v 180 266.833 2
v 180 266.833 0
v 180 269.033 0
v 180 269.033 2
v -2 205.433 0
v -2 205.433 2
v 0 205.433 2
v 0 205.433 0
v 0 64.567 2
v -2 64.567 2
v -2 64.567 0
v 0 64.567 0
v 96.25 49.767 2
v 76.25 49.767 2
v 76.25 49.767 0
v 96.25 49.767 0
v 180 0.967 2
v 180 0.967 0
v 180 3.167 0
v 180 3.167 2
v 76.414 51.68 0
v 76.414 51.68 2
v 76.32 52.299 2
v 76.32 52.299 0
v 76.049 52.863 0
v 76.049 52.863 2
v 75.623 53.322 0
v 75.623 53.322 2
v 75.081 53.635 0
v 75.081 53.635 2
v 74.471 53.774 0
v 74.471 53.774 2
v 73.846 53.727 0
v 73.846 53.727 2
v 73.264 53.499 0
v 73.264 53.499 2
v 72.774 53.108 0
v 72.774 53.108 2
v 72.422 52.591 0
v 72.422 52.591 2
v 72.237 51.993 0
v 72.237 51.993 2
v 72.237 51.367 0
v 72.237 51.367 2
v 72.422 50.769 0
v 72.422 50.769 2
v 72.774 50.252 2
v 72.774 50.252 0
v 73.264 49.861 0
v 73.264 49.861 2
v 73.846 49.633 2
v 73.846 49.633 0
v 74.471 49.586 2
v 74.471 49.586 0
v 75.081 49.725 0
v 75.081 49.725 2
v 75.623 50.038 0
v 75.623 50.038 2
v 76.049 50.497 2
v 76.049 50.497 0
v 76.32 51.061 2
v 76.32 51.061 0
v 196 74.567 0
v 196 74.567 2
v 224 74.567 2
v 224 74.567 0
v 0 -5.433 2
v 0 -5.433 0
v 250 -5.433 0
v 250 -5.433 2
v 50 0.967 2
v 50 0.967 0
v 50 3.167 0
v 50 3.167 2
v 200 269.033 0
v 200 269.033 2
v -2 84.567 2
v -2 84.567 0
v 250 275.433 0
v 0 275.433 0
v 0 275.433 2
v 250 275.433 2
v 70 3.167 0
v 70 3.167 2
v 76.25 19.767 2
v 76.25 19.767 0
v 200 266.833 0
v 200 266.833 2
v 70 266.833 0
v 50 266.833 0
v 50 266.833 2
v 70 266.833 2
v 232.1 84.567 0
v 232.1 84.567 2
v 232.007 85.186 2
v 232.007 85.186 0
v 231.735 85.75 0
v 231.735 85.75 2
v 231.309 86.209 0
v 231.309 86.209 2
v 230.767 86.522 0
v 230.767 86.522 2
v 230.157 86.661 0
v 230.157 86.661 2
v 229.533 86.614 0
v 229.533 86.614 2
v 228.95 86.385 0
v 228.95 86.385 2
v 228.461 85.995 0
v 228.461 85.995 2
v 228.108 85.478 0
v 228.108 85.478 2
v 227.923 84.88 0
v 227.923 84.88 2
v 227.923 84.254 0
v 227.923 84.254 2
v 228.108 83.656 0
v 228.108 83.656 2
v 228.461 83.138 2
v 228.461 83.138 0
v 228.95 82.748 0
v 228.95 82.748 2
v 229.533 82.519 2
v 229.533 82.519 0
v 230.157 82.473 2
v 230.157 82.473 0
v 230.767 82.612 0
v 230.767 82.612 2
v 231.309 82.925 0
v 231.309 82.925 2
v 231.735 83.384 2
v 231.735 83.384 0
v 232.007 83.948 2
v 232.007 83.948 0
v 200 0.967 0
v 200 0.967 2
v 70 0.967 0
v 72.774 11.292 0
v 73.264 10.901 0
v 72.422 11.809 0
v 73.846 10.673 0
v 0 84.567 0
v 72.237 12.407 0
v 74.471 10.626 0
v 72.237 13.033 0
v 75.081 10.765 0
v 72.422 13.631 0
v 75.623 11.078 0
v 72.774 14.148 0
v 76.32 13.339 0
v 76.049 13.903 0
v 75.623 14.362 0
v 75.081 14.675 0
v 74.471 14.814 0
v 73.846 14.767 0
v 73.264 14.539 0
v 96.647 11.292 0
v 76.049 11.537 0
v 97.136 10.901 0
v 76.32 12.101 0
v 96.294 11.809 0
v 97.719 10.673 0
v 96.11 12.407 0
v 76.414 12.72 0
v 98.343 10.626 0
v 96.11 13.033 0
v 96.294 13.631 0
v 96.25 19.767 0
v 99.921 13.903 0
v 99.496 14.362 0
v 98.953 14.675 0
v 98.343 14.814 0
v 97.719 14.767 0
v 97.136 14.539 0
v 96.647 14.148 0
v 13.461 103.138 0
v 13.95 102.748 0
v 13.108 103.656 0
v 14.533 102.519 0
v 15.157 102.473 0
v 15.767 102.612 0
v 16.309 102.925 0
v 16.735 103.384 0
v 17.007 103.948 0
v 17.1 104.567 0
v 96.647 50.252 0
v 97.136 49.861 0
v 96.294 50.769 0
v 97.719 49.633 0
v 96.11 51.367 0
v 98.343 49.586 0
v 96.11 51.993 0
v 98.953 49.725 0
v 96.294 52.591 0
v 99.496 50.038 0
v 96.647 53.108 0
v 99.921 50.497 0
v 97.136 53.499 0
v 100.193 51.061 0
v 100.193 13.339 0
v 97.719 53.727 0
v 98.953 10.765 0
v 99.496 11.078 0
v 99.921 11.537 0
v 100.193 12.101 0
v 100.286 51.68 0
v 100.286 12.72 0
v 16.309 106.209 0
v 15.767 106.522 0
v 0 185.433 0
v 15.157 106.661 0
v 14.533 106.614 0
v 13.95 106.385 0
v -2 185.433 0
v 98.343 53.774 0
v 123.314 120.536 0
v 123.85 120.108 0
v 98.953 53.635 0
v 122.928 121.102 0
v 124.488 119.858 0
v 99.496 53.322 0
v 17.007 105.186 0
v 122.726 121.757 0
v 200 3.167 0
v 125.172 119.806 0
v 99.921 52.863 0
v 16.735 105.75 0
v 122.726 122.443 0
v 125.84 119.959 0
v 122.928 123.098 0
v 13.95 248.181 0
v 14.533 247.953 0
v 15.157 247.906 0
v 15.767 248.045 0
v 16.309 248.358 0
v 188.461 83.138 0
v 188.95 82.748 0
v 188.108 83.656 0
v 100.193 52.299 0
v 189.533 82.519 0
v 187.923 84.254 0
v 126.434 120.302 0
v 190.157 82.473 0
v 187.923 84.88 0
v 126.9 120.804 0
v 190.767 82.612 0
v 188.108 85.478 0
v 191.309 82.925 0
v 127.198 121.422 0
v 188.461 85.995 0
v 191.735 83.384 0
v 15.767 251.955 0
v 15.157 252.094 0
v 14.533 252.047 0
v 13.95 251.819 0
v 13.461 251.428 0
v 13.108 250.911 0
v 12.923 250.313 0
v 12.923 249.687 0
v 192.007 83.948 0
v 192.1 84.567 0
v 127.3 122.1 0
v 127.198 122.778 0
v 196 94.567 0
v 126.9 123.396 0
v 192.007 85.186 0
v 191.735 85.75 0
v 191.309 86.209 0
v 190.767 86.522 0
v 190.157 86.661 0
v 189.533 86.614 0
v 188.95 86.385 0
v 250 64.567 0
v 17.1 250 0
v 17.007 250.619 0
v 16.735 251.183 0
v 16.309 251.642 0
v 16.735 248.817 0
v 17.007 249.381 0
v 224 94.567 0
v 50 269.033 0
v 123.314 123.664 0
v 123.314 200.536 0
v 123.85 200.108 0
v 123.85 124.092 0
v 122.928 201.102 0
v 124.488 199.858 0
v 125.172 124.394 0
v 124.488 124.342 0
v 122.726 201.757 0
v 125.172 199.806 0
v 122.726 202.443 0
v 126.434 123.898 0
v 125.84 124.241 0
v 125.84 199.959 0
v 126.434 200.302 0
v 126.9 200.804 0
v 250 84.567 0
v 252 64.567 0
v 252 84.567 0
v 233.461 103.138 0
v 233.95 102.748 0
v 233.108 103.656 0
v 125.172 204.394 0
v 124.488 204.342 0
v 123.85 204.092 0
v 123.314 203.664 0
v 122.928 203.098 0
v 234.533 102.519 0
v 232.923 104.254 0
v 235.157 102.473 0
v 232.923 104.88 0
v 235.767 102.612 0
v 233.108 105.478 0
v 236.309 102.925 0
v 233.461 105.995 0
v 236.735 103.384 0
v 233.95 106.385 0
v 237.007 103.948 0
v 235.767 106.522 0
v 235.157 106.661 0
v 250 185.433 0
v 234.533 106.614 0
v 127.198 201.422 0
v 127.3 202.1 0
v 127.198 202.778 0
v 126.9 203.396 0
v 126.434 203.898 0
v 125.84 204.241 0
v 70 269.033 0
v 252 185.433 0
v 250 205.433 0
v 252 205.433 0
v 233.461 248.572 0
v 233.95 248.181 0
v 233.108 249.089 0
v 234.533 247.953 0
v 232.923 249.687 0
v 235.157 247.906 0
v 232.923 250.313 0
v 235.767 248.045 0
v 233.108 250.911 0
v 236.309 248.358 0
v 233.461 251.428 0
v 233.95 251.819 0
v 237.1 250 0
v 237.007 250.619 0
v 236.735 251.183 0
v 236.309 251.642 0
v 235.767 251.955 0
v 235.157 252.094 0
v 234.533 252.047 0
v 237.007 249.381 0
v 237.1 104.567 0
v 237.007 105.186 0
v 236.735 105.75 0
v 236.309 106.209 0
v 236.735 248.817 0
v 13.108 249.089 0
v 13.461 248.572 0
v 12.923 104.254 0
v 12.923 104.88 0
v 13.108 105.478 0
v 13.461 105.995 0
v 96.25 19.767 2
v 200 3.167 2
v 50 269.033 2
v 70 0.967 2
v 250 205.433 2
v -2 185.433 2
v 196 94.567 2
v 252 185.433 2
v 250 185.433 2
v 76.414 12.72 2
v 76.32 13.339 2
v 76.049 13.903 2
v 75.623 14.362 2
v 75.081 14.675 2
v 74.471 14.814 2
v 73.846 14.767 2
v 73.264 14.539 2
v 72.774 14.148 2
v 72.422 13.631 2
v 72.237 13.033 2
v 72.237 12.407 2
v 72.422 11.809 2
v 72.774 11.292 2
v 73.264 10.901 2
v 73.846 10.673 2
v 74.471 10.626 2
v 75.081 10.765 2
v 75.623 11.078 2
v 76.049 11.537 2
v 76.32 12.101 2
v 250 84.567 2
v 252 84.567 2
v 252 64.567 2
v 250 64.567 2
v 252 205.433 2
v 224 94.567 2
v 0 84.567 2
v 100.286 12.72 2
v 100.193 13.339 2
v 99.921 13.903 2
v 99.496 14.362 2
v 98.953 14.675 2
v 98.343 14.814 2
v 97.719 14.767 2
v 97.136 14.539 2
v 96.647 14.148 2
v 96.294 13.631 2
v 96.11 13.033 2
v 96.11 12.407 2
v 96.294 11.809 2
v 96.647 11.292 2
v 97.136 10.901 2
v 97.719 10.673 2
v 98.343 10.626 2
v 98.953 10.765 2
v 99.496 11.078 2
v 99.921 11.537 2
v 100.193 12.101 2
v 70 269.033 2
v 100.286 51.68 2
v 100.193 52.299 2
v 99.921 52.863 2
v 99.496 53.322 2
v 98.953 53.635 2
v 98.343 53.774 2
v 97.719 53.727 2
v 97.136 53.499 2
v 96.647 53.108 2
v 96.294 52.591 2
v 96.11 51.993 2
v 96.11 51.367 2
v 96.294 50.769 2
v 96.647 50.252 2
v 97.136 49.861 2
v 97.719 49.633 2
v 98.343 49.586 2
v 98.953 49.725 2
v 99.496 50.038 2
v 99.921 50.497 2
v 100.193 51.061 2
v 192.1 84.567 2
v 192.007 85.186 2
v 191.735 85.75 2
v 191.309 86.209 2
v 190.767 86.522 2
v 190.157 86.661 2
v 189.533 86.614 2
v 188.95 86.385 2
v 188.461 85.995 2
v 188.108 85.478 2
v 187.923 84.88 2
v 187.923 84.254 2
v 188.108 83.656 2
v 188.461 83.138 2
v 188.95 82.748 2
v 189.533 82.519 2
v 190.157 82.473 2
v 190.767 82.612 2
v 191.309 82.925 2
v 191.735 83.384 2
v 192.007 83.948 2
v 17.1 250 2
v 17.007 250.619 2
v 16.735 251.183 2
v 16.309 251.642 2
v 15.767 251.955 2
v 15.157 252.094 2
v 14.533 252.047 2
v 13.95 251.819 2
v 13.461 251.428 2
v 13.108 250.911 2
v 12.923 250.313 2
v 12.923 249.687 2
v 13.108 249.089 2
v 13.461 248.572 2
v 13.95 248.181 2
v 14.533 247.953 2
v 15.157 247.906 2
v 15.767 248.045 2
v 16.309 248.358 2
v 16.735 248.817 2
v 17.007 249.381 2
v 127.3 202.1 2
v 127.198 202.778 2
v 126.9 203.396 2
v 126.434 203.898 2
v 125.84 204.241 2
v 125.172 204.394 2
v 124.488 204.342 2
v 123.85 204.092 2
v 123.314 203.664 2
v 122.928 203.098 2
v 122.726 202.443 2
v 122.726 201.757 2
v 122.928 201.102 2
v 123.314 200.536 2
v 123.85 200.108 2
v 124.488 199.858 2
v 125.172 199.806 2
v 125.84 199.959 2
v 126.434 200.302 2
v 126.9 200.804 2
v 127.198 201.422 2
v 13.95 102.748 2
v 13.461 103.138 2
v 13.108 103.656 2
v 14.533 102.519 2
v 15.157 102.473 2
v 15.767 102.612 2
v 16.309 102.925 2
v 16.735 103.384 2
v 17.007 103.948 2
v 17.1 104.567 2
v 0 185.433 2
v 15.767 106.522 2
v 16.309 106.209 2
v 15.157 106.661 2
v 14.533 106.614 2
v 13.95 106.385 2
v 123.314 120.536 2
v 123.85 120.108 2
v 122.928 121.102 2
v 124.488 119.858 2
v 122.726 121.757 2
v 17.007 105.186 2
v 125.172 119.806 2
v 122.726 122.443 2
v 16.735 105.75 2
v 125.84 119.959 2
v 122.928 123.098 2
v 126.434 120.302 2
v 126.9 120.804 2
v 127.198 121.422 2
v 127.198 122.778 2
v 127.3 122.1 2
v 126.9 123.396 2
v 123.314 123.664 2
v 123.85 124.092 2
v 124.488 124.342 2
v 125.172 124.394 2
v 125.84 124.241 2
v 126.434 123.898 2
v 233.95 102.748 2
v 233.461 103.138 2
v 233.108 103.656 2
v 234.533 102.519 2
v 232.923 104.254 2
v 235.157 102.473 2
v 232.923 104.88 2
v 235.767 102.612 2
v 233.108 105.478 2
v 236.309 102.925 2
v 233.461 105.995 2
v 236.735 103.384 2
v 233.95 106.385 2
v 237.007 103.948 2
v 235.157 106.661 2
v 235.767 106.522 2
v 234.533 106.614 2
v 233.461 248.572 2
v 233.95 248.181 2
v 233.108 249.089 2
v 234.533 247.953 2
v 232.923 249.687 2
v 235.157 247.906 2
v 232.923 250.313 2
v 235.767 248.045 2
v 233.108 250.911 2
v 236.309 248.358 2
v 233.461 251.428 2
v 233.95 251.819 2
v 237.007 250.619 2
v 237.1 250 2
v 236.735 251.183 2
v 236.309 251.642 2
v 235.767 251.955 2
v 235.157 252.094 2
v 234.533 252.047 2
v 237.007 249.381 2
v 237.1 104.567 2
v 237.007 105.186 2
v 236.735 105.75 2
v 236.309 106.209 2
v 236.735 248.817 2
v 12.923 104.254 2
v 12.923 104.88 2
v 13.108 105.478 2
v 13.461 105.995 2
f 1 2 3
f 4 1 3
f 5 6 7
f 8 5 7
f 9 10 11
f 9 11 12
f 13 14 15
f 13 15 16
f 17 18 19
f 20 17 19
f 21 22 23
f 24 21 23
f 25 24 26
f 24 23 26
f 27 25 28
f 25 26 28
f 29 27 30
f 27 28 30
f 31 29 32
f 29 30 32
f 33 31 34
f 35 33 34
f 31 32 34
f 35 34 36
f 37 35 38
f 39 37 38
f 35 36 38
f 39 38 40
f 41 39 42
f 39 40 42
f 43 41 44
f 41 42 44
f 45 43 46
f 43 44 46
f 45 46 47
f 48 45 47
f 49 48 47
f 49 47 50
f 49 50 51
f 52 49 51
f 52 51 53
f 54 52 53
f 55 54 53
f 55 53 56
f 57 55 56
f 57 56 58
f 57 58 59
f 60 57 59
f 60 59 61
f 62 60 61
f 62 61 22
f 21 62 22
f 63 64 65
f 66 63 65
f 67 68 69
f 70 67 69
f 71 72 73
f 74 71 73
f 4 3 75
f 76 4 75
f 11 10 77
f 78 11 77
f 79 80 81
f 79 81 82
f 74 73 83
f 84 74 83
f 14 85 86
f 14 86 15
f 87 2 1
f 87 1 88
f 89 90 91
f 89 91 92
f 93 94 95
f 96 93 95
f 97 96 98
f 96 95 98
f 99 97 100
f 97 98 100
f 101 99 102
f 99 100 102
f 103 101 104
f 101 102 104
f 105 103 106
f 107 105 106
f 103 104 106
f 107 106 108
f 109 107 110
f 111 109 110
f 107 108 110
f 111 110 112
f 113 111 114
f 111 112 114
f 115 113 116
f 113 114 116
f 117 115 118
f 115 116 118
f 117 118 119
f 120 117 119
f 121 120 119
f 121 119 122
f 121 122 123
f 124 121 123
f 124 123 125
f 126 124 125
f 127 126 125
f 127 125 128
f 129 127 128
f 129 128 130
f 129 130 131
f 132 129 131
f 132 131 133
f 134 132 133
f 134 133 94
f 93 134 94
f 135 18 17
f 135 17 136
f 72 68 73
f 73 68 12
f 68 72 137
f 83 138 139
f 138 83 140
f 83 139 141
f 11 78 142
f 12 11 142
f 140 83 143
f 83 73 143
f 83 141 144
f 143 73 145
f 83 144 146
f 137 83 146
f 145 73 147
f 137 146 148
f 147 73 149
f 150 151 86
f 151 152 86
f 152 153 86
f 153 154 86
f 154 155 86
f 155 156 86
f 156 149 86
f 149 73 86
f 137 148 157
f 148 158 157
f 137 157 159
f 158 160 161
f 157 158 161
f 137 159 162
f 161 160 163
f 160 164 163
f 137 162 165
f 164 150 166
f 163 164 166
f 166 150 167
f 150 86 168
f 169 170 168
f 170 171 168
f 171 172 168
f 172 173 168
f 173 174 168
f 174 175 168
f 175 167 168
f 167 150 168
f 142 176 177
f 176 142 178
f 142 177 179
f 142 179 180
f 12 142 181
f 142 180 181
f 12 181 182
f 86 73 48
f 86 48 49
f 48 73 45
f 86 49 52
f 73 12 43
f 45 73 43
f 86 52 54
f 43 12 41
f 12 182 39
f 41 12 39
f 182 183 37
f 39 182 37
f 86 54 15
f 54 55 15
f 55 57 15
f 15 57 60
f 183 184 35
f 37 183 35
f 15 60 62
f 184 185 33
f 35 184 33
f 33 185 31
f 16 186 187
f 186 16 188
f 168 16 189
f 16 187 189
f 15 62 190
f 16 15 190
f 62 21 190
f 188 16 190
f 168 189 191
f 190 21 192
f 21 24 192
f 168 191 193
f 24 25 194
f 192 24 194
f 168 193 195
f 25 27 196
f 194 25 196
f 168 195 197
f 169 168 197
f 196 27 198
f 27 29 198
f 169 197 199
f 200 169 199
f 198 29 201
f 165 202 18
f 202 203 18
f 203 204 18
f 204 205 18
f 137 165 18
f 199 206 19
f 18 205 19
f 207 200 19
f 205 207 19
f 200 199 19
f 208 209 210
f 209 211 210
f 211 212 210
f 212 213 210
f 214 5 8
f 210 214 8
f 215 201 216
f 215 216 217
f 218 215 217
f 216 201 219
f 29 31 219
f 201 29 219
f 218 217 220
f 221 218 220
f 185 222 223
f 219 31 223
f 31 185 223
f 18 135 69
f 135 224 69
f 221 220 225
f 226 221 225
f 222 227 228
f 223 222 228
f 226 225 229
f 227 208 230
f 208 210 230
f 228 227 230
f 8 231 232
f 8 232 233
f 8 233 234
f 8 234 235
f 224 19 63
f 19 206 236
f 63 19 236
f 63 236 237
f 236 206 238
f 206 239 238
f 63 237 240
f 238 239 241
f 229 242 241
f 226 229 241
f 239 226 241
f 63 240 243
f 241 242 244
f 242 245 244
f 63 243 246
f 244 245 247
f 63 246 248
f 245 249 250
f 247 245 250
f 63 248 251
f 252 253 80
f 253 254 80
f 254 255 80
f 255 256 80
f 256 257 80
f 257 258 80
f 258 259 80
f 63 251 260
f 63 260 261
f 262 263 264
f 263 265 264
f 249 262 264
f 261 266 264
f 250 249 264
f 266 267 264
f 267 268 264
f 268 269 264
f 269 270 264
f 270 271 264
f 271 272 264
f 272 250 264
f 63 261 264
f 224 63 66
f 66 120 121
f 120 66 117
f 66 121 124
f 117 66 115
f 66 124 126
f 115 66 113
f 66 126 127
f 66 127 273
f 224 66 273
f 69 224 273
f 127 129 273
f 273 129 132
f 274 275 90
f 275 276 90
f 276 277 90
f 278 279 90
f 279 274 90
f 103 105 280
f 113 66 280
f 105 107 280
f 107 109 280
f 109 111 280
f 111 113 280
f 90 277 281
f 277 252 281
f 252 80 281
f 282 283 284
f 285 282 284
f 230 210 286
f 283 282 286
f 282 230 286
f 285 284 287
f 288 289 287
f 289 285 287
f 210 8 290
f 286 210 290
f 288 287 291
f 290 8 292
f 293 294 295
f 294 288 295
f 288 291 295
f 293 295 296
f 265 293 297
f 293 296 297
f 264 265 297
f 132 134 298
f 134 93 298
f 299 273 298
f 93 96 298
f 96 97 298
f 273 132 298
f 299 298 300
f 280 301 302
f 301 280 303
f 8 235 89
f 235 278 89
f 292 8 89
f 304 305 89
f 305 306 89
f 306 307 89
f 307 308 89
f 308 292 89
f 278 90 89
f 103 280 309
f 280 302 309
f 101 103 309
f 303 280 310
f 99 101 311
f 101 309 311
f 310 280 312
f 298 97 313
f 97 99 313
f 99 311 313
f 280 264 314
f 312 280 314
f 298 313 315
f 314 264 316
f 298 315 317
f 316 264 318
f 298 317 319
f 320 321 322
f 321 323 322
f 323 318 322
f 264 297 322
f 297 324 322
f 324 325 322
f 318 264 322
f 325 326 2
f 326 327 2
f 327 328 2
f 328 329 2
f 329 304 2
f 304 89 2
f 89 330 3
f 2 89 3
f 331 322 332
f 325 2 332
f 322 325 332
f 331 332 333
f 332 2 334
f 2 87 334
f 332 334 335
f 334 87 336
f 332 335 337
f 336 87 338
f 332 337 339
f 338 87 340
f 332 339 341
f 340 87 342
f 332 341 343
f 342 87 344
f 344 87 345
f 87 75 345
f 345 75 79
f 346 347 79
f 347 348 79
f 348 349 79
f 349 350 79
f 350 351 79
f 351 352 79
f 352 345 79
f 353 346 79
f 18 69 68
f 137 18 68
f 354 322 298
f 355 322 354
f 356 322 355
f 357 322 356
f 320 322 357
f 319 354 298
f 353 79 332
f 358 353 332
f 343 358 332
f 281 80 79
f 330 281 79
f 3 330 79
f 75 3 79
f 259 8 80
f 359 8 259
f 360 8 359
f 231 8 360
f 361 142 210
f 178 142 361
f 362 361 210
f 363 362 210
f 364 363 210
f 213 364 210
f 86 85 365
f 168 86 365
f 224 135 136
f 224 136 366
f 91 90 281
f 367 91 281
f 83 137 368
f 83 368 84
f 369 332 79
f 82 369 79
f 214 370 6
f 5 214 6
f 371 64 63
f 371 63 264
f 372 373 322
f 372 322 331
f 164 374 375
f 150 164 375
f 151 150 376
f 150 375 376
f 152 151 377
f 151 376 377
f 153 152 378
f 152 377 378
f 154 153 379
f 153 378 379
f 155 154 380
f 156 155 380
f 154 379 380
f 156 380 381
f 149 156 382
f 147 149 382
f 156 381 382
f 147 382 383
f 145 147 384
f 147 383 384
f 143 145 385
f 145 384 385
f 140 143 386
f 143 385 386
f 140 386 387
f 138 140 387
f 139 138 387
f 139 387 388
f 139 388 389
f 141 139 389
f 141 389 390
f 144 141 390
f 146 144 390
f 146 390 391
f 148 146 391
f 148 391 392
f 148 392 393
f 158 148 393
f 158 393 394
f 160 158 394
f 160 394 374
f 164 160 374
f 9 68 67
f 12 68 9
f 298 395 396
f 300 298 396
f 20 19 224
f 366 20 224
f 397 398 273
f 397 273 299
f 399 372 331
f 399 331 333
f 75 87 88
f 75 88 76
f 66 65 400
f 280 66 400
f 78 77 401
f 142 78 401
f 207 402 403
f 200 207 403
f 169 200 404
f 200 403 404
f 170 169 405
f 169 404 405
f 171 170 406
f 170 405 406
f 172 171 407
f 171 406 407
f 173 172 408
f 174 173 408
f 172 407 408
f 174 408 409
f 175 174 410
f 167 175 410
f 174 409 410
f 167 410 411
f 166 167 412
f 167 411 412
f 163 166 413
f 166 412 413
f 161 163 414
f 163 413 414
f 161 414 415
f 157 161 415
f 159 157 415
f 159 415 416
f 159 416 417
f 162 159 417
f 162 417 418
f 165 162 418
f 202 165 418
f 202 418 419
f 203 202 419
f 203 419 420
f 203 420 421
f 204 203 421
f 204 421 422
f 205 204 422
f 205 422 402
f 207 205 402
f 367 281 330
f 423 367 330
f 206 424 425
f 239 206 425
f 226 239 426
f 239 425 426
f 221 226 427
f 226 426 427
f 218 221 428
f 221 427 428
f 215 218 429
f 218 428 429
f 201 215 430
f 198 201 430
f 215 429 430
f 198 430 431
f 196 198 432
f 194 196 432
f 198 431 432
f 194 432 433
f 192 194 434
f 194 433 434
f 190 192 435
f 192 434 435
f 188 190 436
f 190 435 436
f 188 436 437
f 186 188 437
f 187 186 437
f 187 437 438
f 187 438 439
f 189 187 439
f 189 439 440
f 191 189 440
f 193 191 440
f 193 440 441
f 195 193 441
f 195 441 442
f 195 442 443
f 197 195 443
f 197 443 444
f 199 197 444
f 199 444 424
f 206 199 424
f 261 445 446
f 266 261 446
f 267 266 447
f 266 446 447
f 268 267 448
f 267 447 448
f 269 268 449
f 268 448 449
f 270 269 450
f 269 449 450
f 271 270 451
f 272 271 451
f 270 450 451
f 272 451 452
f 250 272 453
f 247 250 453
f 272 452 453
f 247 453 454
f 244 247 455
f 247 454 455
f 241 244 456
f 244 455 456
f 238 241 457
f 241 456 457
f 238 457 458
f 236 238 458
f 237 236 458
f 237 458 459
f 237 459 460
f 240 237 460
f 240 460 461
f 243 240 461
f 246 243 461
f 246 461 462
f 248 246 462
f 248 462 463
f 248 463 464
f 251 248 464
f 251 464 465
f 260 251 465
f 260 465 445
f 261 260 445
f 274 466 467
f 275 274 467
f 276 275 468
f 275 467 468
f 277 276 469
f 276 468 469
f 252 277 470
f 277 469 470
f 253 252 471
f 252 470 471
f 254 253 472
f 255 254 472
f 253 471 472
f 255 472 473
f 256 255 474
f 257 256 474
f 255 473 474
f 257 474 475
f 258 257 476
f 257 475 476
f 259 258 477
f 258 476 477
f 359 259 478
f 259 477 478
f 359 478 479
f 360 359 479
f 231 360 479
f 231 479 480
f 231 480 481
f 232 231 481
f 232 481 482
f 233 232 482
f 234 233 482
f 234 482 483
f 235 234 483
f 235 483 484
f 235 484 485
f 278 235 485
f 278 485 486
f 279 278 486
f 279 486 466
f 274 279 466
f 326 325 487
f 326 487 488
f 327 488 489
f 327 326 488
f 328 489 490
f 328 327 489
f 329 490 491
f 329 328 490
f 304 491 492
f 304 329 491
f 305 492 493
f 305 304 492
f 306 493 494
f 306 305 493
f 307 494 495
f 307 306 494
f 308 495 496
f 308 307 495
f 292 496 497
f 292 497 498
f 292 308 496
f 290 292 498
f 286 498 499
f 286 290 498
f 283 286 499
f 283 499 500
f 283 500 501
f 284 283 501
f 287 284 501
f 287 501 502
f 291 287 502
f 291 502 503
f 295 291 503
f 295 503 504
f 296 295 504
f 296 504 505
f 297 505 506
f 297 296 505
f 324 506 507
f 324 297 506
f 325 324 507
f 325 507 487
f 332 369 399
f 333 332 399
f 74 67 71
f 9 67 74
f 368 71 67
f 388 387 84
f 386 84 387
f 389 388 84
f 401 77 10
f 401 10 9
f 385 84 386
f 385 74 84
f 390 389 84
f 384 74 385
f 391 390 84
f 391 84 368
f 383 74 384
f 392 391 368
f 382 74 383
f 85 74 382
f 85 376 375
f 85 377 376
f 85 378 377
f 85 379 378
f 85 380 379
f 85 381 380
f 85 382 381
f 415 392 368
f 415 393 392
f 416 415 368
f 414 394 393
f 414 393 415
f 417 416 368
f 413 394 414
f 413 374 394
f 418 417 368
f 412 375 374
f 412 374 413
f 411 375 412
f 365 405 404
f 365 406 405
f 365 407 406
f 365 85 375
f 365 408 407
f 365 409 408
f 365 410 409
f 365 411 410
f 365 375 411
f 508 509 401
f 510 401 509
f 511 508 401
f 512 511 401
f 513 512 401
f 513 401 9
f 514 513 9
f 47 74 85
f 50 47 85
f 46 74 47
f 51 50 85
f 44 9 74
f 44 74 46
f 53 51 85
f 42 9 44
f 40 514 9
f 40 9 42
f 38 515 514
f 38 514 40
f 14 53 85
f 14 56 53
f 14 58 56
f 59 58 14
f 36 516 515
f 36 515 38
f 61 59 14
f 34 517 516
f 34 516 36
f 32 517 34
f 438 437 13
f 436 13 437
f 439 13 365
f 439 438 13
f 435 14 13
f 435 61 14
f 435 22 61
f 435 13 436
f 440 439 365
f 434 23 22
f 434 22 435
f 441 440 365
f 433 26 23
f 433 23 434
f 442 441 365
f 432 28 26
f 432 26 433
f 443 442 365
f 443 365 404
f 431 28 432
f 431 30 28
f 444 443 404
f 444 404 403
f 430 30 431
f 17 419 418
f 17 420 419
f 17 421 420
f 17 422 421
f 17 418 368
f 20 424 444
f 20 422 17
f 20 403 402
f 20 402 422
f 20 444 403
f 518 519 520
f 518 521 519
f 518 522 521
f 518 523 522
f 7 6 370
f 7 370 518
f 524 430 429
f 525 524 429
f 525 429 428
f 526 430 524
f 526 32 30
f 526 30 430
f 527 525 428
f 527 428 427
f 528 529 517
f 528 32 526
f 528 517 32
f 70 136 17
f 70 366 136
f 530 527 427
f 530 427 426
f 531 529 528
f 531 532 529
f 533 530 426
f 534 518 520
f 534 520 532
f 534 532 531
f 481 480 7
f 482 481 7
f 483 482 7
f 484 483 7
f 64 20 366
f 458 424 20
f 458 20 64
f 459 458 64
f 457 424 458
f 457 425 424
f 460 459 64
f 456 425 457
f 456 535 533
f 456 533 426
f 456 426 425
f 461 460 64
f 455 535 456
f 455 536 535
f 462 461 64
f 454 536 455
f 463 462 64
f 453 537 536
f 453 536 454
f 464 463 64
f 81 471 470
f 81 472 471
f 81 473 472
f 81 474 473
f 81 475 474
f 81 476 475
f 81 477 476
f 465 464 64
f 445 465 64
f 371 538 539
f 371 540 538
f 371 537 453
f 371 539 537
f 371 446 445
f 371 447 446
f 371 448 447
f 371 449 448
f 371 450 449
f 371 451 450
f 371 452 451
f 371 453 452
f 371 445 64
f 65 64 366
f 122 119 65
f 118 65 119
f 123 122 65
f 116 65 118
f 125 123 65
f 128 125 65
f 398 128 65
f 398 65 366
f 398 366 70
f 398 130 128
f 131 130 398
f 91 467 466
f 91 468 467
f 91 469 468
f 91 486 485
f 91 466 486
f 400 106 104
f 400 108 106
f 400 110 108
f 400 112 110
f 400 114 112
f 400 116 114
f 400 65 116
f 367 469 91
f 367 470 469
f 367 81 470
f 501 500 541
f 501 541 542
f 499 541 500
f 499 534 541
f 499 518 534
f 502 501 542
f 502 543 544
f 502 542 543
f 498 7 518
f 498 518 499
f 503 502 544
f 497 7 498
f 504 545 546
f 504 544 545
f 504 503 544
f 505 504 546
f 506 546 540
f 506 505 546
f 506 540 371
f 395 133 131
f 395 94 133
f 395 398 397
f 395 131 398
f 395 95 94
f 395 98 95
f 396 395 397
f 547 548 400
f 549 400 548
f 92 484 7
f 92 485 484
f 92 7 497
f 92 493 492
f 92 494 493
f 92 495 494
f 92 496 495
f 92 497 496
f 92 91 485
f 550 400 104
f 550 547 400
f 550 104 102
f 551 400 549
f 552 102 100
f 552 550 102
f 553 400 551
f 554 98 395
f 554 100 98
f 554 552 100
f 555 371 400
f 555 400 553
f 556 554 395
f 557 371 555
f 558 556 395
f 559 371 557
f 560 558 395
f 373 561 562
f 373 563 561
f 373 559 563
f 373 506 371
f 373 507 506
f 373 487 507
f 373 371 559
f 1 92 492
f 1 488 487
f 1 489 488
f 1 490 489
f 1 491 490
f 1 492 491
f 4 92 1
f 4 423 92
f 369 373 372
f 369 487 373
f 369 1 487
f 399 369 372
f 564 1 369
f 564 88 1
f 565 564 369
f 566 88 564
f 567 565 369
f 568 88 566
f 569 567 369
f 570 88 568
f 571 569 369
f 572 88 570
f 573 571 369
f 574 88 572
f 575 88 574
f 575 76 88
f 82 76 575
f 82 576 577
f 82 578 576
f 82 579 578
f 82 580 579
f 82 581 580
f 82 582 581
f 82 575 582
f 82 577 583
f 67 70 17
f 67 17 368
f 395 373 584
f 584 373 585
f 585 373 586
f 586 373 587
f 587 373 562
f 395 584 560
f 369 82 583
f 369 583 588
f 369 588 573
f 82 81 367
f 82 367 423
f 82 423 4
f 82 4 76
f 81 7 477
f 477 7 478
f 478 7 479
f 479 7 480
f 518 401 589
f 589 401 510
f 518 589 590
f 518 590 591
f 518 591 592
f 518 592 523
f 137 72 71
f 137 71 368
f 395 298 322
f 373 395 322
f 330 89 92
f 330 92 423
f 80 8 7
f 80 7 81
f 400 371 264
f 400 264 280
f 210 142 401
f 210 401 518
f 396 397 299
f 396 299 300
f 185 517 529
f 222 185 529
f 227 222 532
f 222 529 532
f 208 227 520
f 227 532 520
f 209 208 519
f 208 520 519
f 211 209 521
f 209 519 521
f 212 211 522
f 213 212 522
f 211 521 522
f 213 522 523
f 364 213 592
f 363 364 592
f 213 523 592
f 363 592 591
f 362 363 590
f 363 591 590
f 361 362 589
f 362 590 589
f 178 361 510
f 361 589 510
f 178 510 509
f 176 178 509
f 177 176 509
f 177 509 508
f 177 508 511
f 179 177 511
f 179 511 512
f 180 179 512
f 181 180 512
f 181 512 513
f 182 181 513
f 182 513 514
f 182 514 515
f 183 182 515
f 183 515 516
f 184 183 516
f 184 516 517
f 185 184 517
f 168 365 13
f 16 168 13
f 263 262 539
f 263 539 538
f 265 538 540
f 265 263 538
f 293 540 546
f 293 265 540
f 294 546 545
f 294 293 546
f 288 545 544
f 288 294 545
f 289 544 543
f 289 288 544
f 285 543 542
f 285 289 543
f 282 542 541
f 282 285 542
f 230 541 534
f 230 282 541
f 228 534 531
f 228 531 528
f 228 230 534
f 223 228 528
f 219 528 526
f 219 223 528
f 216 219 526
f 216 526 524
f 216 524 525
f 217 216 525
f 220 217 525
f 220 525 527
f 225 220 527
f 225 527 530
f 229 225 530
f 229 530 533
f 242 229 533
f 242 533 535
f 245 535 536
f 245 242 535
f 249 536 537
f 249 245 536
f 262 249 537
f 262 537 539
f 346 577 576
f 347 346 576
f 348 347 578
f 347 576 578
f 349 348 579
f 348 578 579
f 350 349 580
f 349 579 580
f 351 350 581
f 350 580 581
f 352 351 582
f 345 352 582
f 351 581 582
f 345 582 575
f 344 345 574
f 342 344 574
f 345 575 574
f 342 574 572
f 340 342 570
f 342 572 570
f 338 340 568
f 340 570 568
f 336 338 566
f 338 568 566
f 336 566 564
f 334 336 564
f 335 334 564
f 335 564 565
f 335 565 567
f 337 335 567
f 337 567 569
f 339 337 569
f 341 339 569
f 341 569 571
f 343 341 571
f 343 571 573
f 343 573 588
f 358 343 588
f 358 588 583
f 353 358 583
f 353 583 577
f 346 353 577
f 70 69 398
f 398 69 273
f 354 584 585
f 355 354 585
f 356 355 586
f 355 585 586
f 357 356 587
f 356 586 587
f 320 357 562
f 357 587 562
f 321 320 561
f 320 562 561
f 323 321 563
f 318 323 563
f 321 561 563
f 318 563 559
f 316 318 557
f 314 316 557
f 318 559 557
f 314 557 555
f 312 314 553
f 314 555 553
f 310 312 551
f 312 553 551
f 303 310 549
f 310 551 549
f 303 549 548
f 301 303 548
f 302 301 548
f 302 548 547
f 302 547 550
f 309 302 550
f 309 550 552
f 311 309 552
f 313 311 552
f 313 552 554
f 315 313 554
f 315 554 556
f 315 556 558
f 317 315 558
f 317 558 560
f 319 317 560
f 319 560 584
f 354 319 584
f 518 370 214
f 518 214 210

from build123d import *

# Parameters (mm, degrees)
SKETCH1_W           = 250
SKETCH1_H           = 280.866666666
SKETCH1_R           = 2.3
SKETCH1_W_2         = 20
SKETCH1_H_2         = 2.2
BOSS_EXTRUDE1_DEPTH = 2
SKETCH2_W           = 2
SKETCH2_H           = 20
BOSS_EXTRUDE2_DEPTH = 2
SKETCH3_R           = 2.1
SKETCH3_W           = 28
SKETCH3_H           = 20
CUT_EXTRUDE1_DEPTH  = 5
SKETCH4_W           = 20
SKETCH4_H           = 30
CUT_EXTRUDE2_DEPTH  = 5
SKETCH5_R           = 2.1
CUT_EXTRUDE3_DEPTH  = 3
SKETCH6_R           = 2.1
CUT_EXTRUDE4_DEPTH  = 5
SKETCH7_R           = 2.1
CUT_EXTRUDE5_DEPTH  = 5


with BuildPart() as part:
    # Sketch1 → Boss-Extrude1 (new body)
    with BuildSketch(Plane.XY):
        with Locations((125, 135)):
            Rectangle(SKETCH1_W, SKETCH1_H)
        with Locations((125, 122.1)):
            Circle(SKETCH1_R, mode=Mode.SUBTRACT)
        with Locations((125, 202.1)):
            Circle(SKETCH1_R, mode=Mode.SUBTRACT)
        with Locations((190, 2.066666667)):
            Rectangle(SKETCH1_W_2, SKETCH1_H_2, mode=Mode.SUBTRACT)
        with Locations((60, 2.066666667)):
            Rectangle(SKETCH1_W_2, SKETCH1_H_2, mode=Mode.SUBTRACT)
        with Locations((190, 267.933333333)):
            Rectangle(SKETCH1_W_2, SKETCH1_H_2, mode=Mode.SUBTRACT)
        with Locations((60, 267.933333333)):
            Rectangle(SKETCH1_W_2, SKETCH1_H_2, mode=Mode.SUBTRACT)
    extrude(amount=BOSS_EXTRUDE1_DEPTH)

    # Sketch2 → Boss-Extrude2 (add)
    with BuildSketch(Plane.XY.offset(2)):
        with Locations((-1, 195.433333333)):
            Rectangle(SKETCH2_W, SKETCH2_H)
        with Locations((-1, 74.566666667)):
            Rectangle(SKETCH2_W, SKETCH2_H)
        with Locations((251, 195.433333333)):
            Rectangle(SKETCH2_W, SKETCH2_H)
        with Locations((251, 74.566666667)):
            Rectangle(SKETCH2_W, SKETCH2_H)
    extrude(amount=-BOSS_EXTRUDE2_DEPTH)

    # Sketch3 → Cut-Extrude1 (cut)
    with BuildSketch(Plane.XY.offset(2)):
        with Locations((190, 84.566666667)):
            Circle(SKETCH3_R)
        with Locations((230, 84.566666667)):
            Circle(SKETCH3_R)
        with Locations((210, 84.566666667)):
            Rectangle(SKETCH3_W, SKETCH3_H)
    extrude(amount=-CUT_EXTRUDE1_DEPTH, mode=Mode.SUBTRACT)

    # Sketch4 → Cut-Extrude2 (cut)
    with BuildSketch(Plane.XY.offset(2)):
        with Locations((86.25, 34.766666667)):
            Rectangle(SKETCH4_W, SKETCH4_H)
    extrude(amount=-CUT_EXTRUDE2_DEPTH, mode=Mode.SUBTRACT)

    # Sketch5 → Cut-Extrude3 (cut, through all)
    with BuildSketch(Plane.XY.offset(2)):
        with Locations((98.18627451, 12.72)):
            Circle(SKETCH5_R)
        with Locations((74.31372549, 12.72)):
            Circle(SKETCH5_R)
        with Locations((74.31372549, 51.68)):
            Circle(SKETCH5_R)
        with Locations((98.18627451, 51.68)):
            Circle(SKETCH5_R)
    extrude(amount=-CUT_EXTRUDE3_DEPTH, mode=Mode.SUBTRACT)

    # Sketch6 → Cut-Extrude4 (cut)
    with BuildSketch(Plane.XY.offset(2)):
        with Locations((235, 250)):
            Circle(SKETCH6_R)
        with Locations((15, 250)):
            Circle(SKETCH6_R)
    extrude(amount=-CUT_EXTRUDE4_DEPTH, mode=Mode.SUBTRACT)

    # Sketch7 → Cut-Extrude5 (cut)
    with BuildSketch(Plane.XY.offset(2)):
        with Locations((15, 104.566666667)):
            Circle(SKETCH7_R)
        with Locations((235, 104.566666667)):
            Circle(SKETCH7_R)
    extrude(amount=-CUT_EXTRUDE5_DEPTH, mode=Mode.SUBTRACT)


solid = part.part
